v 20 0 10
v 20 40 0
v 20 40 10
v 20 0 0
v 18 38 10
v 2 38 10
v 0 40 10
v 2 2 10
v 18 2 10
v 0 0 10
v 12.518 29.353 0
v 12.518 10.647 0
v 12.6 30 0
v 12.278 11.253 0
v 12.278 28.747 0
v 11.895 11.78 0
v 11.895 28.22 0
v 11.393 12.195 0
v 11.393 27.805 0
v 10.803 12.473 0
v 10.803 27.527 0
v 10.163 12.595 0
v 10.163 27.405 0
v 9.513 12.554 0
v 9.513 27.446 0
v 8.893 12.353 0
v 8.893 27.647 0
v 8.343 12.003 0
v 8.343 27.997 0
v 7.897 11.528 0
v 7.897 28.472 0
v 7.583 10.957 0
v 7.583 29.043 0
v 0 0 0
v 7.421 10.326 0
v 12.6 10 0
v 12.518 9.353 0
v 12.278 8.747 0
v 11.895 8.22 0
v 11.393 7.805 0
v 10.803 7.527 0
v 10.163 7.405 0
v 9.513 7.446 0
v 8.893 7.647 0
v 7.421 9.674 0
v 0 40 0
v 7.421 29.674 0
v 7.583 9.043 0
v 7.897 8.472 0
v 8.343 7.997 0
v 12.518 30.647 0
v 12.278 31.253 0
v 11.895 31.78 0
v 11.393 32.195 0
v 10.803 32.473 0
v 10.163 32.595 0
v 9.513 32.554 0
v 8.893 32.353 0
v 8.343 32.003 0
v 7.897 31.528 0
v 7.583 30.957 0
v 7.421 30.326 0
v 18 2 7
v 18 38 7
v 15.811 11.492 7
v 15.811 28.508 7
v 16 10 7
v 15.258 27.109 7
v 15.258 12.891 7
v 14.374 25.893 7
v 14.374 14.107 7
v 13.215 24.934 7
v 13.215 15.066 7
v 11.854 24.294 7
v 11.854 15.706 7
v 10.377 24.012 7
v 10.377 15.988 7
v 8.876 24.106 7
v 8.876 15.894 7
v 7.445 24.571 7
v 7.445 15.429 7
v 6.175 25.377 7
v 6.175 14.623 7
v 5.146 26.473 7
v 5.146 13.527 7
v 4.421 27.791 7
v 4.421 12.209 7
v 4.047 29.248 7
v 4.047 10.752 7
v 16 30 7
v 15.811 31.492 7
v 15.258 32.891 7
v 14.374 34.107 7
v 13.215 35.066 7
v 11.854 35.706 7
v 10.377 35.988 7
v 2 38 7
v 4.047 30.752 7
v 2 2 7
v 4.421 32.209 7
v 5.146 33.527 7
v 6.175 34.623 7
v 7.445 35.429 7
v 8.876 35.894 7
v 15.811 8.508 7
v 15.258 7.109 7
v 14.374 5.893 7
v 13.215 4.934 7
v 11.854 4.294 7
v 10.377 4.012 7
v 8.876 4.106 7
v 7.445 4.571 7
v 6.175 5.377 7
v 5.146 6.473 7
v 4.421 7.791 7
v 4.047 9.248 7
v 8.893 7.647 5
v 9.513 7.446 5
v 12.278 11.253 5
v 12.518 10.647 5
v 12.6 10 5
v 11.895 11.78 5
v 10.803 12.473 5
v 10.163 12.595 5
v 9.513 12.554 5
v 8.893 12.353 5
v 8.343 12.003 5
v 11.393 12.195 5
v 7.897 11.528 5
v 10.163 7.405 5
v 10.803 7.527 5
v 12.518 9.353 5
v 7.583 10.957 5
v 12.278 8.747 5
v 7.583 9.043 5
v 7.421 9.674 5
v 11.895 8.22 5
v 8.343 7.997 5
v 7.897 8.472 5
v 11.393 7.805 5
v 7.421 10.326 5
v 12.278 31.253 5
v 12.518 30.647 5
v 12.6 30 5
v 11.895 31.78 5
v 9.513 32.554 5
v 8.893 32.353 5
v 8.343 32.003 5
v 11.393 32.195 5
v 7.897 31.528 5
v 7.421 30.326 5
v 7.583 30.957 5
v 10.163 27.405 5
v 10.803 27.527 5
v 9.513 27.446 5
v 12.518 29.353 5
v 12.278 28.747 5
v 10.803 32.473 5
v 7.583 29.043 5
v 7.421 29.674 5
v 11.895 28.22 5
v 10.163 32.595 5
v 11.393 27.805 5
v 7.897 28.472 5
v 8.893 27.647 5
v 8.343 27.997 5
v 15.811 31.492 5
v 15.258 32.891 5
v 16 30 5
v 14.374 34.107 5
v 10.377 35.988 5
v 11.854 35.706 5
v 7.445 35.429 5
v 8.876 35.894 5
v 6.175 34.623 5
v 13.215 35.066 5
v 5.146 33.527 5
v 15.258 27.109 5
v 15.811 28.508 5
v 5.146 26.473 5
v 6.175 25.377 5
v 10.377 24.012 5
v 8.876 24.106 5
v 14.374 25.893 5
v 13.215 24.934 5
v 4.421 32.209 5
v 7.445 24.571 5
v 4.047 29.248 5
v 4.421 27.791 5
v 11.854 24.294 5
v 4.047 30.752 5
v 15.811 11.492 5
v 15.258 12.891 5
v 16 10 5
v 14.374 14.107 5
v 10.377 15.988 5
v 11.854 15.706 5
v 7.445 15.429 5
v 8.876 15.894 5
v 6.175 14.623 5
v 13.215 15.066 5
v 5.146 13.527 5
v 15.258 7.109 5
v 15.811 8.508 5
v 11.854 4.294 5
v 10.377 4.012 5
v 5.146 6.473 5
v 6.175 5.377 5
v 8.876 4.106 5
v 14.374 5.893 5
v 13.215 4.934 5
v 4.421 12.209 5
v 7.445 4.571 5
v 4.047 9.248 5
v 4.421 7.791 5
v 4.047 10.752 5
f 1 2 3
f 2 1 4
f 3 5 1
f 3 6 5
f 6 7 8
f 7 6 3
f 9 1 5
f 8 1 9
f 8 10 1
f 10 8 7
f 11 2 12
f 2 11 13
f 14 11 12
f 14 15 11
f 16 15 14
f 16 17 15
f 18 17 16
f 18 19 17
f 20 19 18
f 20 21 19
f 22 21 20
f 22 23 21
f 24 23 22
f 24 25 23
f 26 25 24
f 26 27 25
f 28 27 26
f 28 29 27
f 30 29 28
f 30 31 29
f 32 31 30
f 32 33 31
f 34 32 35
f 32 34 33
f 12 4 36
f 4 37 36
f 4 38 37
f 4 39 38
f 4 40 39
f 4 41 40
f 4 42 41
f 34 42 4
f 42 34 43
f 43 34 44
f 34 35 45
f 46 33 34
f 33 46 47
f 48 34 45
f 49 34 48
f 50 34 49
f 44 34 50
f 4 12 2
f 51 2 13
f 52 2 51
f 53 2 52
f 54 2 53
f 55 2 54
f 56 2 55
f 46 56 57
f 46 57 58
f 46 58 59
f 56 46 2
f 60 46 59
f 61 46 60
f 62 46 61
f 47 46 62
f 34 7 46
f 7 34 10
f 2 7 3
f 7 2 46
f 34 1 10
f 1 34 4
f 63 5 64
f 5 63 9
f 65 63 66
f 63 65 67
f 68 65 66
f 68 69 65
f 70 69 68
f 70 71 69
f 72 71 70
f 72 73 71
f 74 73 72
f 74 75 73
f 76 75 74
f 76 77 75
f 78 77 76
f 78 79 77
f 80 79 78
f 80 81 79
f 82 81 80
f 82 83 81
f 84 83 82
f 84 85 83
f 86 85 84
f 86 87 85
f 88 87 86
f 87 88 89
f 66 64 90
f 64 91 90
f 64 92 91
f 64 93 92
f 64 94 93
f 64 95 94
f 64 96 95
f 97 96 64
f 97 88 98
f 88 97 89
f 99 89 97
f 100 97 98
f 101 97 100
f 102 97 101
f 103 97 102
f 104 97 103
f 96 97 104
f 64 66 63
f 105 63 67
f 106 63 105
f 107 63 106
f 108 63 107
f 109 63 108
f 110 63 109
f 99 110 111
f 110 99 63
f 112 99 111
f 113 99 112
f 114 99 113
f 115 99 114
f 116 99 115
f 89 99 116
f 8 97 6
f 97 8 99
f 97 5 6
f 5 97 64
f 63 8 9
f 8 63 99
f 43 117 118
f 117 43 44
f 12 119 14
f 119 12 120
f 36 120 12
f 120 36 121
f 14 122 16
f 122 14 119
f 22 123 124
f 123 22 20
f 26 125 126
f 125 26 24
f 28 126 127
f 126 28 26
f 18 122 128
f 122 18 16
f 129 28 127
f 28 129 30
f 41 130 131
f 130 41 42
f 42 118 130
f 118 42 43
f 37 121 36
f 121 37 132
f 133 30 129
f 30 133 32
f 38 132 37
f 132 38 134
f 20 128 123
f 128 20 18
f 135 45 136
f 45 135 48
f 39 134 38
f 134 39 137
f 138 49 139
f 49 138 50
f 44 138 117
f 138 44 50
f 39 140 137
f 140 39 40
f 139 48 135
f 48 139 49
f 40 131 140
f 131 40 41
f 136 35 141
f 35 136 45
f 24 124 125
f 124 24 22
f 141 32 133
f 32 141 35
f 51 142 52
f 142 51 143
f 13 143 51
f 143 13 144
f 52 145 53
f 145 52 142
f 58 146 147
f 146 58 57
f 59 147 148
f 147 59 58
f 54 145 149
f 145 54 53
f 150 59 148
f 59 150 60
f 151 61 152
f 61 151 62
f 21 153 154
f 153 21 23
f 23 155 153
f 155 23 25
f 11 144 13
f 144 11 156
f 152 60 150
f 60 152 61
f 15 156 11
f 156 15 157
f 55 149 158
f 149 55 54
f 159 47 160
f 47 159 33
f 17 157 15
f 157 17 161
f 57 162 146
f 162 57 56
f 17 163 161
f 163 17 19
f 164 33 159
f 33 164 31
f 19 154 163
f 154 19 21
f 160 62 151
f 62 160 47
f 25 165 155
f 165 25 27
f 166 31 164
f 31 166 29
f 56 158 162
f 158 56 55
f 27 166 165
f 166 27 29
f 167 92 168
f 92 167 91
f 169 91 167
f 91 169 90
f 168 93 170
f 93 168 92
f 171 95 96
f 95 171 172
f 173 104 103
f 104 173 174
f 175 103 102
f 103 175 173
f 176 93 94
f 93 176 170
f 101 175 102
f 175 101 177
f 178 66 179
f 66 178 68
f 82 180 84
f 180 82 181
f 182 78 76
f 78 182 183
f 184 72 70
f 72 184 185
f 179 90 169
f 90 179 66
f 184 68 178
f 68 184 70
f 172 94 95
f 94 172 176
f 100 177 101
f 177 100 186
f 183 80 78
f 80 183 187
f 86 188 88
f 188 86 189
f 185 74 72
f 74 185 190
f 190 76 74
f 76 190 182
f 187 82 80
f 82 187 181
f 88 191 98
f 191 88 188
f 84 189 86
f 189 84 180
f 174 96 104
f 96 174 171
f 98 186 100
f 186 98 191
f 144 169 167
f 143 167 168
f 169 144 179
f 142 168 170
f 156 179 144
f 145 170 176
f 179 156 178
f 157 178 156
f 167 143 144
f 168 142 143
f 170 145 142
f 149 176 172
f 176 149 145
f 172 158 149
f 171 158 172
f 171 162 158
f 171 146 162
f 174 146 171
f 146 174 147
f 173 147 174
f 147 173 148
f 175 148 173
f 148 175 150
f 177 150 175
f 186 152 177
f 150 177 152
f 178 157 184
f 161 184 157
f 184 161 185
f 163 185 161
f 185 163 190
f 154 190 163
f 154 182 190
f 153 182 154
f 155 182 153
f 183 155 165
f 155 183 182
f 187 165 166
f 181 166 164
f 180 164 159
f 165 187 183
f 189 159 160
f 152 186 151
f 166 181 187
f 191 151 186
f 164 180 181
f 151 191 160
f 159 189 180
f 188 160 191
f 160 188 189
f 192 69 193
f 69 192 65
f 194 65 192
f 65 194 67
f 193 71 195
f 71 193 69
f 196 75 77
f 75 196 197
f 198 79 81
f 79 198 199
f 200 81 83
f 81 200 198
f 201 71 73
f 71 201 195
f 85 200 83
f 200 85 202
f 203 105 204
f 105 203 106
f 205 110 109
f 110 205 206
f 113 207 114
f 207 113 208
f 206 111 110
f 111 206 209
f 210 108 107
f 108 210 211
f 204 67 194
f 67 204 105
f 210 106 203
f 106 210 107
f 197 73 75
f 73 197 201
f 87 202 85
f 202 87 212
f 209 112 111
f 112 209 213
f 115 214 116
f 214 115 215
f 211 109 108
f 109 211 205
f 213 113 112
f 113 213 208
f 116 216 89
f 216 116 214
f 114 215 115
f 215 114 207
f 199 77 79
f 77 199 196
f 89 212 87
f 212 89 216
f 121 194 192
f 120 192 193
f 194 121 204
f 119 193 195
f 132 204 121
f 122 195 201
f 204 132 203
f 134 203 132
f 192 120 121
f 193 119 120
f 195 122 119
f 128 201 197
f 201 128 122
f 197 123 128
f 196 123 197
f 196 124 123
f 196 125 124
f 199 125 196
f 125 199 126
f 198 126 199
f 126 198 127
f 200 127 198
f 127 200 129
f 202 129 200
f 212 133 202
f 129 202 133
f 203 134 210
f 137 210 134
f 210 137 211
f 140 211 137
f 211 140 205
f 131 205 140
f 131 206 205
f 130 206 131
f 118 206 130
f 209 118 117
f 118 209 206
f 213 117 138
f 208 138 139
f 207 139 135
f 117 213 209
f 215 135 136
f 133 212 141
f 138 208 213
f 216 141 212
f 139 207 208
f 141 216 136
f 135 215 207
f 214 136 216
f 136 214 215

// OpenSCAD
difference(){
    cube([20,40,10]);
    translate([2,2,7]) cube([16, 36, 5]);
    
    translate([10, 10, 0]) cylinder(d=5.2, h=10, $fn=25);
    translate([10, 30, 0]) cylinder(d=5.2, h=10, $fn=25);
    translate([10, 30, 5]) cylinder(d=12, h=10, $fn=25);
     translate([10, 10, 5]) cylinder(d=12, h=10, $fn=25);
}
